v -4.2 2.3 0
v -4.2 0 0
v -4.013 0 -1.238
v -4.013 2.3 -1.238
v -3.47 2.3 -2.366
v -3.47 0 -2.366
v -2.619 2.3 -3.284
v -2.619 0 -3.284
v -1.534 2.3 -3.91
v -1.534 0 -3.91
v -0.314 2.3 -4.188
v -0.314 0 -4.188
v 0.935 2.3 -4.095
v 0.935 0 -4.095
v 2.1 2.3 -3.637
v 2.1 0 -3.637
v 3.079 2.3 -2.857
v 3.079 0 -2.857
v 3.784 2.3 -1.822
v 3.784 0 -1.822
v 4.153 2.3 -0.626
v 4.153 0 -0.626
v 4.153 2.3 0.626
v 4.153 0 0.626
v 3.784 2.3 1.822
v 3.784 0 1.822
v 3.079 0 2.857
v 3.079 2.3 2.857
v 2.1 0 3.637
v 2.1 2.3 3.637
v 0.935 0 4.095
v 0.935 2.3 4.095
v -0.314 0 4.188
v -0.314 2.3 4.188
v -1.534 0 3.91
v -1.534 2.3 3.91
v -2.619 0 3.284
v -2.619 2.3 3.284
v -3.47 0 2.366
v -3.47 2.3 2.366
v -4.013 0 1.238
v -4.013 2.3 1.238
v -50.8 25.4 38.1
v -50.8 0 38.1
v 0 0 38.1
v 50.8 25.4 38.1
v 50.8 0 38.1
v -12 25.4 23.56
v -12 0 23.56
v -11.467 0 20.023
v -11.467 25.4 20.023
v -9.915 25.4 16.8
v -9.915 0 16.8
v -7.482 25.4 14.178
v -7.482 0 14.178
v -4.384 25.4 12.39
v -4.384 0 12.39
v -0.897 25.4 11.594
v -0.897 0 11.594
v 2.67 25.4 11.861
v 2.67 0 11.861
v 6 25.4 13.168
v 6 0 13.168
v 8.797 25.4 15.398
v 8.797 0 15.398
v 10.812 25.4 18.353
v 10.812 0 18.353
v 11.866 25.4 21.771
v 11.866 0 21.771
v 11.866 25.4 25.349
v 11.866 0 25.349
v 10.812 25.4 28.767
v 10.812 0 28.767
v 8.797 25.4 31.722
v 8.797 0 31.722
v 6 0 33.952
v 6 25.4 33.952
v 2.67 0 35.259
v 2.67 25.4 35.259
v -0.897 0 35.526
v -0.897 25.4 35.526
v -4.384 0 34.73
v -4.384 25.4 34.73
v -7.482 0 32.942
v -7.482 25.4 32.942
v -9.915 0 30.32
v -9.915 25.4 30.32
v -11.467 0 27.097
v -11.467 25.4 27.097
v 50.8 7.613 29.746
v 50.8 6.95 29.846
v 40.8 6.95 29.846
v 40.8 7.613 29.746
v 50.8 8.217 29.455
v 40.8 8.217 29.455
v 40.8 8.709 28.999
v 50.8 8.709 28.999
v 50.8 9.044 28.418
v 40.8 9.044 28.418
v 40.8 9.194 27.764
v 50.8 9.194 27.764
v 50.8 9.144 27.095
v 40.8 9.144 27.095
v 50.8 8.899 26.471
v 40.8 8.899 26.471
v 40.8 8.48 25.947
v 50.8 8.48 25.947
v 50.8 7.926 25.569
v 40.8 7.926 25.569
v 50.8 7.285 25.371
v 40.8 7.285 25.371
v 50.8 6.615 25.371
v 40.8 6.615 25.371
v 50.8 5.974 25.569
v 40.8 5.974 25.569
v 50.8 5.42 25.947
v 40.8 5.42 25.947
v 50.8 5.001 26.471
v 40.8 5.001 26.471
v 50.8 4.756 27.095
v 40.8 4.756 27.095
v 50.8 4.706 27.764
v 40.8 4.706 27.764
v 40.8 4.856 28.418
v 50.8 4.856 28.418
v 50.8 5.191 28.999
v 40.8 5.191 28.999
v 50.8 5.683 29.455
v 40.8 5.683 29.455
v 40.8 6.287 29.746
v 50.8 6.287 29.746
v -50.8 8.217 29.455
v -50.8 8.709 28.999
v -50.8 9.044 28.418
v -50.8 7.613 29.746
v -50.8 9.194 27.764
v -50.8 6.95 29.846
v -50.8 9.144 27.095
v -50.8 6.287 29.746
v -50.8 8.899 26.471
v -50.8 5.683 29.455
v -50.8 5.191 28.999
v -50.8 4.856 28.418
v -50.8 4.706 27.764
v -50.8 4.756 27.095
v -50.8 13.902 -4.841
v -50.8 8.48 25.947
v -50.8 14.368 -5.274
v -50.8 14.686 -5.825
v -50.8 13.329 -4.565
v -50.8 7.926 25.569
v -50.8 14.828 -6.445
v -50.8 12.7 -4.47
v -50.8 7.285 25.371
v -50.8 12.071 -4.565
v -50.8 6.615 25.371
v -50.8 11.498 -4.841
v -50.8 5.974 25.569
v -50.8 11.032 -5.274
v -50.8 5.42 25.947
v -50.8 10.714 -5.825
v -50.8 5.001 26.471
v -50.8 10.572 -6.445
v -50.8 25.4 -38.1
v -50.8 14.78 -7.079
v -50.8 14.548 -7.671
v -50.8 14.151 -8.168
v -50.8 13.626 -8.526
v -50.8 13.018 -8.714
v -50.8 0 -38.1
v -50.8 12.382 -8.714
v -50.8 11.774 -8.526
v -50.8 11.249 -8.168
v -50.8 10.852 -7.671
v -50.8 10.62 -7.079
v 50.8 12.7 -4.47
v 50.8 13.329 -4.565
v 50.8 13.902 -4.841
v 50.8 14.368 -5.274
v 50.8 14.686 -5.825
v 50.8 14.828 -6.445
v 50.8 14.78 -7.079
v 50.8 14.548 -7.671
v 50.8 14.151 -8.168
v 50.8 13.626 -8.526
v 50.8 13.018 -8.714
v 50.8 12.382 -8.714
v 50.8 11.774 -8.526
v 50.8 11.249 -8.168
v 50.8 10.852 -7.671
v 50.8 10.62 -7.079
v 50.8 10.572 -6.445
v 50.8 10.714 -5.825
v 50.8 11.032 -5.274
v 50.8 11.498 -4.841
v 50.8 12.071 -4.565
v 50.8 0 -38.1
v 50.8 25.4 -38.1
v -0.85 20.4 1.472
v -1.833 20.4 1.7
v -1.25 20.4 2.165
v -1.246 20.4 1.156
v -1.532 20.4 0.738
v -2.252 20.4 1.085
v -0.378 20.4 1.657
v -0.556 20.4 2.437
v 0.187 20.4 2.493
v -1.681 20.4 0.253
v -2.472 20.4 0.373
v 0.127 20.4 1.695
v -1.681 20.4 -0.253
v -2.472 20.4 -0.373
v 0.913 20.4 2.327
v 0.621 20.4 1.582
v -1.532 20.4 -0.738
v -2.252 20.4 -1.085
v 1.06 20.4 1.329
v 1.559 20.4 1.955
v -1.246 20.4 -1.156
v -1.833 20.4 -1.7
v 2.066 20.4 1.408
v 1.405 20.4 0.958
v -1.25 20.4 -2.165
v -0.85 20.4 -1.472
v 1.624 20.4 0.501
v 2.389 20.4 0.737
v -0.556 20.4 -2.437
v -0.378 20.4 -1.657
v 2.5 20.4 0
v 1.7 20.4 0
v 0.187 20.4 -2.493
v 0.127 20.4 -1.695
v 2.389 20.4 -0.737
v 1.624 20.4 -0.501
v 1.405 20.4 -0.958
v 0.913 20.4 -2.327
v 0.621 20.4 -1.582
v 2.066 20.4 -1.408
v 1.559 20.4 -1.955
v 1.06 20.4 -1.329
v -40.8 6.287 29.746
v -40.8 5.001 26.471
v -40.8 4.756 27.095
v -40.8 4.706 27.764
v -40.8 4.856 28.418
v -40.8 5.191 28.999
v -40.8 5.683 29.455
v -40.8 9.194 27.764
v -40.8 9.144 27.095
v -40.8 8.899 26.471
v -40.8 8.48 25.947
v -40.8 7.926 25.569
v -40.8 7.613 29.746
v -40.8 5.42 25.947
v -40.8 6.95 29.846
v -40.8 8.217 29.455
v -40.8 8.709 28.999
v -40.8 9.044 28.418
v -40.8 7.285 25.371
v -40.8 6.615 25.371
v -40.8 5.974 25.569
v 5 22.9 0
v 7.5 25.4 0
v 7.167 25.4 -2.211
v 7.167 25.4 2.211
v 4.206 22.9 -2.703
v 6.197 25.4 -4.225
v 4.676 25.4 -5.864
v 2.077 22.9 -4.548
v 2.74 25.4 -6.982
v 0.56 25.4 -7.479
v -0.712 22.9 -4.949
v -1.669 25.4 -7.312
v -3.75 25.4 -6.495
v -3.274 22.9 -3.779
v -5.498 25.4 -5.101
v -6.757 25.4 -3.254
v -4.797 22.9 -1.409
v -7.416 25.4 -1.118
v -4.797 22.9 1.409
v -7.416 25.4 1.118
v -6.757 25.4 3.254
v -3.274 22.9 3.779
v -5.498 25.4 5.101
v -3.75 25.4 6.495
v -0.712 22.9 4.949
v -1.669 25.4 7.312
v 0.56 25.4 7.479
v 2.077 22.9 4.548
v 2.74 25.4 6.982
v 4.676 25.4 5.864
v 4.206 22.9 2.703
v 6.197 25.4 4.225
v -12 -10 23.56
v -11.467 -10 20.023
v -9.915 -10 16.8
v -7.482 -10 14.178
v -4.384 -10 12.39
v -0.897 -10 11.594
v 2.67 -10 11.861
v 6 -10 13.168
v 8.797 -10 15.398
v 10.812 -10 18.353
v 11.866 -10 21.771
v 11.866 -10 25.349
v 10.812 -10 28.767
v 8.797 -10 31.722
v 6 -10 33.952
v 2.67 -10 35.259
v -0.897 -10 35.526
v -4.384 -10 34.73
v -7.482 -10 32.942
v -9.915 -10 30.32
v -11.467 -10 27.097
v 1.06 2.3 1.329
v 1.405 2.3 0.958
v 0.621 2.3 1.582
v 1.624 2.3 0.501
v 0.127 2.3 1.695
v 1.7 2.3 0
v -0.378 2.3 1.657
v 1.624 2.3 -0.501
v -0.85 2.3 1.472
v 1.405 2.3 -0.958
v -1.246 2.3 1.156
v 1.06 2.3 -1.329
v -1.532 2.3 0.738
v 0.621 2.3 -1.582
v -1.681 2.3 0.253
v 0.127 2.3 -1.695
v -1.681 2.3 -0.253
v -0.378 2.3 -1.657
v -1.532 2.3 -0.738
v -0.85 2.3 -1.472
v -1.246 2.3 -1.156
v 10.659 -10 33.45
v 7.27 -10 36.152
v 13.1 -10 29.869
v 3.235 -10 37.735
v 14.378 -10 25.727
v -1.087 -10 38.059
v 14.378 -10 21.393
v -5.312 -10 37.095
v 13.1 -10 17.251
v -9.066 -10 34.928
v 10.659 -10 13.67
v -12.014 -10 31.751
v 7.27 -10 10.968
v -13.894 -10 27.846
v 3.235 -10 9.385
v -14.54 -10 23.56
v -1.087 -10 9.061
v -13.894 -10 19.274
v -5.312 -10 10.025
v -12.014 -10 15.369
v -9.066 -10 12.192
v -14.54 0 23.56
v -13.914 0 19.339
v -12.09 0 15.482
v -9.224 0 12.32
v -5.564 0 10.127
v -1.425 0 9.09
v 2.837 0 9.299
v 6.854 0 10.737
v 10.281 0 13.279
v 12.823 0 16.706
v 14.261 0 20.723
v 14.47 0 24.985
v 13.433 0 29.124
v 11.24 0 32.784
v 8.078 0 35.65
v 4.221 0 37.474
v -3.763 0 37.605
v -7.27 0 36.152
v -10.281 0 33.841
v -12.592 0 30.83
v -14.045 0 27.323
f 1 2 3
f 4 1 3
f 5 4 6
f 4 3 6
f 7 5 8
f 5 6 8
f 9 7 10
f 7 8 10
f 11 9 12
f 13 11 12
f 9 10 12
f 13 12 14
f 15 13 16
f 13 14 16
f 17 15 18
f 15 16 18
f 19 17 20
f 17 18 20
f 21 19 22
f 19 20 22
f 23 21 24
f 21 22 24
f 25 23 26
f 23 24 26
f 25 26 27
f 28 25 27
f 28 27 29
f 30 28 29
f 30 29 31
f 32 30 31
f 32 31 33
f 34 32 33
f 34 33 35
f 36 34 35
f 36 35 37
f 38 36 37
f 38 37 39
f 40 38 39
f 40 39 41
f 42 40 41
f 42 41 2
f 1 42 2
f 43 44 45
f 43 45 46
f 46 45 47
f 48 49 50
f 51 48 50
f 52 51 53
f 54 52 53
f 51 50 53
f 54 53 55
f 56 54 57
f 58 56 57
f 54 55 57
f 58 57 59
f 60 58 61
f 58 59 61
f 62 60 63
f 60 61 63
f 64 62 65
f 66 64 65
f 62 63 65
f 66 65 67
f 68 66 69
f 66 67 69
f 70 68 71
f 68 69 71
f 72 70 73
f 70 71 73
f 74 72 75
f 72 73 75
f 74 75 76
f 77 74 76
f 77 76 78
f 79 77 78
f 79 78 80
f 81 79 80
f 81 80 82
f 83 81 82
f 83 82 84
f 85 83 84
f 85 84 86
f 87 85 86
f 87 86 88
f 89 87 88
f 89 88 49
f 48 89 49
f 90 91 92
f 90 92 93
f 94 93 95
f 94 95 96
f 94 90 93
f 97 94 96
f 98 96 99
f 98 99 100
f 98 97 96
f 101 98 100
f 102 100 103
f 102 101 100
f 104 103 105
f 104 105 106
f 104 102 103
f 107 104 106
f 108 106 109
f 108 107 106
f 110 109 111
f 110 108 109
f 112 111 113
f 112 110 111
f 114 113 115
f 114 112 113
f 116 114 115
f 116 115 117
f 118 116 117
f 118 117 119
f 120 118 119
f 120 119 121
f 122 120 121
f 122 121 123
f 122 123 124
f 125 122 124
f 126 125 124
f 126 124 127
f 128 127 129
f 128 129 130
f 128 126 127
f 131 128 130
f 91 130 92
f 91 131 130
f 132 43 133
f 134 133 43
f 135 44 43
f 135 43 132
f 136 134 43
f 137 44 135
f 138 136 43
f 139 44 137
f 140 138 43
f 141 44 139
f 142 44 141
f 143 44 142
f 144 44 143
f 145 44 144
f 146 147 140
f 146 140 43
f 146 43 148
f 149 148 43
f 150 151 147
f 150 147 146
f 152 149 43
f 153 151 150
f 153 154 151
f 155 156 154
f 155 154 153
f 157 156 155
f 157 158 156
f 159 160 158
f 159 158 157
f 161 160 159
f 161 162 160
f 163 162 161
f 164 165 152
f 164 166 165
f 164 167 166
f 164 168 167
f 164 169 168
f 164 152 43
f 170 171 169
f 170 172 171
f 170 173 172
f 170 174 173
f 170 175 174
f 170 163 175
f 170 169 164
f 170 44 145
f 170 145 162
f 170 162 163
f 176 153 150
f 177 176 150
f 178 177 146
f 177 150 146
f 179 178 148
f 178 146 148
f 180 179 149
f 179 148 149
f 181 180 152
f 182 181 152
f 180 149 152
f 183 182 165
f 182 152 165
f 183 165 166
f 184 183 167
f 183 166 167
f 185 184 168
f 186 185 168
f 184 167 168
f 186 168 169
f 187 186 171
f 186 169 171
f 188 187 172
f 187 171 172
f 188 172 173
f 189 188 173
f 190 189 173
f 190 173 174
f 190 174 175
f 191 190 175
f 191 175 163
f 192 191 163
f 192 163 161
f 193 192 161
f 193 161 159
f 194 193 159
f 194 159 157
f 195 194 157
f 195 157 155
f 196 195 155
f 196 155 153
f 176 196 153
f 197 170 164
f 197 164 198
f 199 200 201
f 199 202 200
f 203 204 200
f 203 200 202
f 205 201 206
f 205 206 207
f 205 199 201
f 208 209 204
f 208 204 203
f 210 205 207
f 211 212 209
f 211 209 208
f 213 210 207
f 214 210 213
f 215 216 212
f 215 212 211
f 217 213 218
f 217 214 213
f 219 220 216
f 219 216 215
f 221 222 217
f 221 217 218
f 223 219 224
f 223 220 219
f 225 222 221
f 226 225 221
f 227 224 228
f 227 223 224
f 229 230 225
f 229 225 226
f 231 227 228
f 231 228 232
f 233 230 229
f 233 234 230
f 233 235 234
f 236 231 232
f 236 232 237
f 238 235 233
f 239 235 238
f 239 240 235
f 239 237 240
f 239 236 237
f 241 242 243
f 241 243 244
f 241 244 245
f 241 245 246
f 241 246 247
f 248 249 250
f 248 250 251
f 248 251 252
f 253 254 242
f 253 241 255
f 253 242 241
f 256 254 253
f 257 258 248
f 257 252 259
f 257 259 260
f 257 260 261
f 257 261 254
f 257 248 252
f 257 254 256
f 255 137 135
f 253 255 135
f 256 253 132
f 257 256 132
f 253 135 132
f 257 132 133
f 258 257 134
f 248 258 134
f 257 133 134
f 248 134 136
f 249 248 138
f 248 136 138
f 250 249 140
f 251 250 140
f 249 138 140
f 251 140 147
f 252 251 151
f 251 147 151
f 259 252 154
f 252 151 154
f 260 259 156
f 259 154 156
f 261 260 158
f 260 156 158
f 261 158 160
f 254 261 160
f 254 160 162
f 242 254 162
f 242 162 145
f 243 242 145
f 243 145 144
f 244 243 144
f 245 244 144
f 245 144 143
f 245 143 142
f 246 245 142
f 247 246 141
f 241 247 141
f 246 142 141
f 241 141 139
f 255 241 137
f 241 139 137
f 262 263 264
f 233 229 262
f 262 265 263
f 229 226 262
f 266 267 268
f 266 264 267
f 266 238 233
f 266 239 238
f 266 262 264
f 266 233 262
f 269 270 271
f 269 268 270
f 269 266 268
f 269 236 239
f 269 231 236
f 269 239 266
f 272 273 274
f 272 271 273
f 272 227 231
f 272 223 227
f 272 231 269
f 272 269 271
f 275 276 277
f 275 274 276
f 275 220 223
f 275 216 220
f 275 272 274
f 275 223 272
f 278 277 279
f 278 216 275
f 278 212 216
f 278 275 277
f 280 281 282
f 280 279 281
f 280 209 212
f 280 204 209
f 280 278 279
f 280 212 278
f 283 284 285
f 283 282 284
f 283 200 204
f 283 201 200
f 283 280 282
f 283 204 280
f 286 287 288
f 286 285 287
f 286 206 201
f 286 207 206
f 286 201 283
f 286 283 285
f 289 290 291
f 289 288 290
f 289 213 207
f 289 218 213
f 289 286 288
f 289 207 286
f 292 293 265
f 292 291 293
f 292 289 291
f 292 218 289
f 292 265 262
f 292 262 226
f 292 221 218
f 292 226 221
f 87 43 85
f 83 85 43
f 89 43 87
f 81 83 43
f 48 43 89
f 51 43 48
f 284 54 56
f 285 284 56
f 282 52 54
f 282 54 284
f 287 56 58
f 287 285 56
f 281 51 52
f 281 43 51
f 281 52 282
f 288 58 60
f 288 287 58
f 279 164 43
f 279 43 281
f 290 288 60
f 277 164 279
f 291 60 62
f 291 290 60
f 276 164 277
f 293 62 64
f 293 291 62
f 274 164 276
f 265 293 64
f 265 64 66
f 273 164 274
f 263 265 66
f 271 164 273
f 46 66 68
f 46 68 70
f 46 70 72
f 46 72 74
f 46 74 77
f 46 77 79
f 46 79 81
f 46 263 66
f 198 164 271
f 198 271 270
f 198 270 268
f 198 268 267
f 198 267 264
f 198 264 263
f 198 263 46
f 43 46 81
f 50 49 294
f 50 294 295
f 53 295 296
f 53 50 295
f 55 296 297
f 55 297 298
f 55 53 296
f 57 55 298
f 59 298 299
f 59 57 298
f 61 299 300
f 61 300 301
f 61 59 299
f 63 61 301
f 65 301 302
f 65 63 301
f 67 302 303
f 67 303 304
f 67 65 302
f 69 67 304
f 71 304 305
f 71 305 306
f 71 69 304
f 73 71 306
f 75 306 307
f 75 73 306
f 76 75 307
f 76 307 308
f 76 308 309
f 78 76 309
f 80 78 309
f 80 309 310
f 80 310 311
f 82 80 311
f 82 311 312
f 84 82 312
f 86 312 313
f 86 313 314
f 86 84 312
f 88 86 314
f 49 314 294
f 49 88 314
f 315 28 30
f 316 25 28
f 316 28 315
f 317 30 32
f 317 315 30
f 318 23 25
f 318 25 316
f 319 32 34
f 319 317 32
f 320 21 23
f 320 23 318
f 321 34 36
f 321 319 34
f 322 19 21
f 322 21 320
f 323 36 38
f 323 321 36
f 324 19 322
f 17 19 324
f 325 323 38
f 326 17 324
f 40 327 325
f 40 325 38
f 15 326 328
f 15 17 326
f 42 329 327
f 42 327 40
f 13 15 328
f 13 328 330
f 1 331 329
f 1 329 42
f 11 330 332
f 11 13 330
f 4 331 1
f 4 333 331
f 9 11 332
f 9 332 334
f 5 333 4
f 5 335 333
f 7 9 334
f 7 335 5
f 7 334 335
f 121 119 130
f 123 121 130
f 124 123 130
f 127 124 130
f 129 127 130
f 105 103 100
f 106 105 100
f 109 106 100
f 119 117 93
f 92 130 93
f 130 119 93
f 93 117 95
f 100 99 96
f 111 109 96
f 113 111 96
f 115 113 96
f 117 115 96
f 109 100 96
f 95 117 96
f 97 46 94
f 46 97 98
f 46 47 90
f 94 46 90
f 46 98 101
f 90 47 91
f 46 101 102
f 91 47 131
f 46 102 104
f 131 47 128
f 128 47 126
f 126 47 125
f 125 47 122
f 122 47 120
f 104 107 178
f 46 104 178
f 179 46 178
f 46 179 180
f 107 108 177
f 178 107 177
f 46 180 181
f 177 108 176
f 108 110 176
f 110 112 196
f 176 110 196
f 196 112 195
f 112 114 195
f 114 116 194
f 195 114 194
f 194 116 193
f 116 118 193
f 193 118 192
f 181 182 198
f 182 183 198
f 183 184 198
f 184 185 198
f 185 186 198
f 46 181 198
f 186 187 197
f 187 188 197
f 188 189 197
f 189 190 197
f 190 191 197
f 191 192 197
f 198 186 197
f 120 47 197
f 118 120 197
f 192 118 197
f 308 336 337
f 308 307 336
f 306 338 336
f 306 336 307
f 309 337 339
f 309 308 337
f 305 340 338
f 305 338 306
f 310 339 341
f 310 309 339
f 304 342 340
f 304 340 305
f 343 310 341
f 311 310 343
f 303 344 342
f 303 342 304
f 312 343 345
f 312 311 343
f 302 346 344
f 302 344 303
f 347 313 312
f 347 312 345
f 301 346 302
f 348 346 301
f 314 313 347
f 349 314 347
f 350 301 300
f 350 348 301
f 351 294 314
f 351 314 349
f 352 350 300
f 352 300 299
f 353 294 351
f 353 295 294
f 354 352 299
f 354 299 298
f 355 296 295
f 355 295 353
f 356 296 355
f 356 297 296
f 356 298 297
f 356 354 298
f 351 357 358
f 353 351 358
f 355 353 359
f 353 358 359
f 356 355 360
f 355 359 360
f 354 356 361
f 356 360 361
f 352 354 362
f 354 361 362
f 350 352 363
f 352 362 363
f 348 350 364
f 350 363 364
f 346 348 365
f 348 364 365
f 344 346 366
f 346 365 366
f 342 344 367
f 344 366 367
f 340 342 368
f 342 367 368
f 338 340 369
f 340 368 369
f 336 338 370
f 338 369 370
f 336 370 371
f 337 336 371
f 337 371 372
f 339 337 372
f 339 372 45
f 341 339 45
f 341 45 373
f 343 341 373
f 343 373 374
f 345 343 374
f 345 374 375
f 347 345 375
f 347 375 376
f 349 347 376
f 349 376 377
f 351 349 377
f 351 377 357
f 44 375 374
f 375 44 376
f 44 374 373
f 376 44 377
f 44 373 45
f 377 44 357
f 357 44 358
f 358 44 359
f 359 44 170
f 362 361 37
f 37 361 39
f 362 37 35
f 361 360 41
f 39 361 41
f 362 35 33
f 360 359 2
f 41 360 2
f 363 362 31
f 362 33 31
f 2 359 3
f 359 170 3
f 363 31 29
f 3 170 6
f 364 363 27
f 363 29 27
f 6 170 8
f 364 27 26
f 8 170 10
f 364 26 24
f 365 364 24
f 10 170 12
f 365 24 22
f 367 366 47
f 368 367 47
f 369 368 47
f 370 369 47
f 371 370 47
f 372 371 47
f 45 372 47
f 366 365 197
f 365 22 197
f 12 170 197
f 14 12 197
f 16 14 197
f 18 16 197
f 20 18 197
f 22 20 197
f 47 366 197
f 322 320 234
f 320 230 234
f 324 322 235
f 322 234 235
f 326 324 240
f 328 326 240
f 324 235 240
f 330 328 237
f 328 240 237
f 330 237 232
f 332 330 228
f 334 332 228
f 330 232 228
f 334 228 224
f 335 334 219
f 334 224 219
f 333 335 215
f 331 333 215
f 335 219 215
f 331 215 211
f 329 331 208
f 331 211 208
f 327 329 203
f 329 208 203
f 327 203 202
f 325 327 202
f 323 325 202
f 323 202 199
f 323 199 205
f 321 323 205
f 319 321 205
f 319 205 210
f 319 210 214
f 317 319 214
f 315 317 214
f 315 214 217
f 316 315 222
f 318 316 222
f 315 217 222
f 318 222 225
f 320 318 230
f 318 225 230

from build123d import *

# Parameters (mm, degrees)
SKETCH1_W                                        = 101.6
SKETCH1_H                                        = 76.2
BOSS_EXTRUDE1_DEPTH                              = 25.4
CBORE_FOR_M3_HEX_HEAD_MACHINE_SCREW1_D           = 3.4
CBORE_FOR_M3_HEX_HEAD_MACHINE_SCREW1_DEPTH       = 25.4
CBORE_FOR_M3_HEX_HEAD_MACHINE_SCREW1_CBORE_D     = 8.4
CBORE_FOR_M3_HEX_HEAD_MACHINE_SCREW1_CBORE_DEPTH = 2.3
SKETCH9_R                                        = 7.5
CUT_EXTRUDE1_DEPTH                               = 5
CUT_EXTRUDE1_TAPER                               = 45
SKETCH12_R                                       = 5
CUT_EXTRUDE3_DEPTH                               = 10
SKETCH13_R                                       = 2.1336
CUT_EXTRUDE4_DEPTH                               = 102.6
CUT_EXTRUDE5_REACH                               = 27.4
SKETCH14_R                                       = 12
SKETCH14_2_R                                     = 14.54
SKETCH14_2_R_2                                   = 12
EXTRUDE_THIN1_DEPTH                              = 10
SKETCH15_R                                       = 2.25
CUT_EXTRUDE6_DEPTH                               = 10


with BuildPart() as part:
    # Sketch1 → Boss-Extrude1 (new body)
    with BuildSketch(Plane(origin=(0, 0, 0), x_dir=(1, 0, 0), z_dir=(0, 1, 0))):
        Rectangle(SKETCH1_W, SKETCH1_H)
    extrude(amount=BOSS_EXTRUDE1_DEPTH)

    # CBORE for M3 Hex Head Machine Screw1
    with Locations(Plane(origin=(0, 0, 0), x_dir=(-1, 0, 0), z_dir=(0, -1, 0))):
        with Locations((0, 0)):
            CounterBoreHole(CBORE_FOR_M3_HEX_HEAD_MACHINE_SCREW1_D / 2, CBORE_FOR_M3_HEX_HEAD_MACHINE_SCREW1_CBORE_D / 2, CBORE_FOR_M3_HEX_HEAD_MACHINE_SCREW1_CBORE_DEPTH, depth=CBORE_FOR_M3_HEX_HEAD_MACHINE_SCREW1_DEPTH)

    # Sketch9 → Cut-Extrude1 (cut)
    with BuildSketch(Plane(origin=(0, 25.4, 0), x_dir=(1, 0, 0), z_dir=(0, 1, 0))):
        Circle(SKETCH9_R)
    extrude(amount=-CUT_EXTRUDE1_DEPTH, taper=CUT_EXTRUDE1_TAPER, mode=Mode.SUBTRACT)

    # Sketch12 → Cut-Extrude3 (cut)
    with BuildSketch(Plane(origin=(0, 25.4, 0), x_dir=(1, 0, 0), z_dir=(0, 1, 0))):
        with Locations((0, -20)):
            Circle(SKETCH12_R)
    extrude(amount=-CUT_EXTRUDE3_DEPTH, mode=Mode.SUBTRACT)

    # Sketch13 → Cut-Extrude4 (cut, through all)
    with BuildSketch(Plane.ZY.offset(50.8)):
        with Locations((-6.604, 12.7)):
            Circle(SKETCH13_R)
    extrude(amount=-CUT_EXTRUDE4_DEPTH, mode=Mode.SUBTRACT)

    # Sketch14 → Cut-Extrude5 (cut, up to next)
    with BuildSketch(Plane(origin=(0, 0, 0), x_dir=(-1, 0, 0), z_dir=(0, -1, 0)), mode=Mode.PRIVATE) as cut_extrude5_sk1:
        with Locations((0, -23.56)):
            Circle(SKETCH14_R)
    cut_extrude5_tool1 = extrude(cut_extrude5_sk1.sketch, amount=-CUT_EXTRUDE5_REACH, mode=Mode.PRIVATE) & part.part
    add(cut_extrude5_tool1.solids().sort_by_distance((0, 0, 23.56))[0], mode=Mode.SUBTRACT)

    # Sketch14<2> → Extrude-Thin1 (add)
    with BuildSketch(Plane(origin=(0, 0, 0), x_dir=(-1, 0, 0), z_dir=(0, -1, 0))):
        with Locations((0, -23.56)):
            Circle(SKETCH14_2_R)
        with Locations((0, -23.56)):
            Circle(SKETCH14_2_R_2, mode=Mode.SUBTRACT)
    extrude(amount=EXTRUDE_THIN1_DEPTH)

    # Sketch15 → Cut-Extrude6 (cut)
    with BuildSketch(Plane.ZY.offset(50.8)):
        with Locations((27.596, 6.95)):
            Circle(SKETCH15_R)
    cut_extrude6 = extrude(amount=-CUT_EXTRUDE6_DEPTH, mode=Mode.SUBTRACT)

    # Mirror1: Cut-Extrude6 across plane
    add(cut_extrude6.mirror(Plane(origin=(0, 0, 0), x_dir=(0, 0, 1), z_dir=(1, 0, 0))), mode=Mode.SUBTRACT)


solid = part.part
